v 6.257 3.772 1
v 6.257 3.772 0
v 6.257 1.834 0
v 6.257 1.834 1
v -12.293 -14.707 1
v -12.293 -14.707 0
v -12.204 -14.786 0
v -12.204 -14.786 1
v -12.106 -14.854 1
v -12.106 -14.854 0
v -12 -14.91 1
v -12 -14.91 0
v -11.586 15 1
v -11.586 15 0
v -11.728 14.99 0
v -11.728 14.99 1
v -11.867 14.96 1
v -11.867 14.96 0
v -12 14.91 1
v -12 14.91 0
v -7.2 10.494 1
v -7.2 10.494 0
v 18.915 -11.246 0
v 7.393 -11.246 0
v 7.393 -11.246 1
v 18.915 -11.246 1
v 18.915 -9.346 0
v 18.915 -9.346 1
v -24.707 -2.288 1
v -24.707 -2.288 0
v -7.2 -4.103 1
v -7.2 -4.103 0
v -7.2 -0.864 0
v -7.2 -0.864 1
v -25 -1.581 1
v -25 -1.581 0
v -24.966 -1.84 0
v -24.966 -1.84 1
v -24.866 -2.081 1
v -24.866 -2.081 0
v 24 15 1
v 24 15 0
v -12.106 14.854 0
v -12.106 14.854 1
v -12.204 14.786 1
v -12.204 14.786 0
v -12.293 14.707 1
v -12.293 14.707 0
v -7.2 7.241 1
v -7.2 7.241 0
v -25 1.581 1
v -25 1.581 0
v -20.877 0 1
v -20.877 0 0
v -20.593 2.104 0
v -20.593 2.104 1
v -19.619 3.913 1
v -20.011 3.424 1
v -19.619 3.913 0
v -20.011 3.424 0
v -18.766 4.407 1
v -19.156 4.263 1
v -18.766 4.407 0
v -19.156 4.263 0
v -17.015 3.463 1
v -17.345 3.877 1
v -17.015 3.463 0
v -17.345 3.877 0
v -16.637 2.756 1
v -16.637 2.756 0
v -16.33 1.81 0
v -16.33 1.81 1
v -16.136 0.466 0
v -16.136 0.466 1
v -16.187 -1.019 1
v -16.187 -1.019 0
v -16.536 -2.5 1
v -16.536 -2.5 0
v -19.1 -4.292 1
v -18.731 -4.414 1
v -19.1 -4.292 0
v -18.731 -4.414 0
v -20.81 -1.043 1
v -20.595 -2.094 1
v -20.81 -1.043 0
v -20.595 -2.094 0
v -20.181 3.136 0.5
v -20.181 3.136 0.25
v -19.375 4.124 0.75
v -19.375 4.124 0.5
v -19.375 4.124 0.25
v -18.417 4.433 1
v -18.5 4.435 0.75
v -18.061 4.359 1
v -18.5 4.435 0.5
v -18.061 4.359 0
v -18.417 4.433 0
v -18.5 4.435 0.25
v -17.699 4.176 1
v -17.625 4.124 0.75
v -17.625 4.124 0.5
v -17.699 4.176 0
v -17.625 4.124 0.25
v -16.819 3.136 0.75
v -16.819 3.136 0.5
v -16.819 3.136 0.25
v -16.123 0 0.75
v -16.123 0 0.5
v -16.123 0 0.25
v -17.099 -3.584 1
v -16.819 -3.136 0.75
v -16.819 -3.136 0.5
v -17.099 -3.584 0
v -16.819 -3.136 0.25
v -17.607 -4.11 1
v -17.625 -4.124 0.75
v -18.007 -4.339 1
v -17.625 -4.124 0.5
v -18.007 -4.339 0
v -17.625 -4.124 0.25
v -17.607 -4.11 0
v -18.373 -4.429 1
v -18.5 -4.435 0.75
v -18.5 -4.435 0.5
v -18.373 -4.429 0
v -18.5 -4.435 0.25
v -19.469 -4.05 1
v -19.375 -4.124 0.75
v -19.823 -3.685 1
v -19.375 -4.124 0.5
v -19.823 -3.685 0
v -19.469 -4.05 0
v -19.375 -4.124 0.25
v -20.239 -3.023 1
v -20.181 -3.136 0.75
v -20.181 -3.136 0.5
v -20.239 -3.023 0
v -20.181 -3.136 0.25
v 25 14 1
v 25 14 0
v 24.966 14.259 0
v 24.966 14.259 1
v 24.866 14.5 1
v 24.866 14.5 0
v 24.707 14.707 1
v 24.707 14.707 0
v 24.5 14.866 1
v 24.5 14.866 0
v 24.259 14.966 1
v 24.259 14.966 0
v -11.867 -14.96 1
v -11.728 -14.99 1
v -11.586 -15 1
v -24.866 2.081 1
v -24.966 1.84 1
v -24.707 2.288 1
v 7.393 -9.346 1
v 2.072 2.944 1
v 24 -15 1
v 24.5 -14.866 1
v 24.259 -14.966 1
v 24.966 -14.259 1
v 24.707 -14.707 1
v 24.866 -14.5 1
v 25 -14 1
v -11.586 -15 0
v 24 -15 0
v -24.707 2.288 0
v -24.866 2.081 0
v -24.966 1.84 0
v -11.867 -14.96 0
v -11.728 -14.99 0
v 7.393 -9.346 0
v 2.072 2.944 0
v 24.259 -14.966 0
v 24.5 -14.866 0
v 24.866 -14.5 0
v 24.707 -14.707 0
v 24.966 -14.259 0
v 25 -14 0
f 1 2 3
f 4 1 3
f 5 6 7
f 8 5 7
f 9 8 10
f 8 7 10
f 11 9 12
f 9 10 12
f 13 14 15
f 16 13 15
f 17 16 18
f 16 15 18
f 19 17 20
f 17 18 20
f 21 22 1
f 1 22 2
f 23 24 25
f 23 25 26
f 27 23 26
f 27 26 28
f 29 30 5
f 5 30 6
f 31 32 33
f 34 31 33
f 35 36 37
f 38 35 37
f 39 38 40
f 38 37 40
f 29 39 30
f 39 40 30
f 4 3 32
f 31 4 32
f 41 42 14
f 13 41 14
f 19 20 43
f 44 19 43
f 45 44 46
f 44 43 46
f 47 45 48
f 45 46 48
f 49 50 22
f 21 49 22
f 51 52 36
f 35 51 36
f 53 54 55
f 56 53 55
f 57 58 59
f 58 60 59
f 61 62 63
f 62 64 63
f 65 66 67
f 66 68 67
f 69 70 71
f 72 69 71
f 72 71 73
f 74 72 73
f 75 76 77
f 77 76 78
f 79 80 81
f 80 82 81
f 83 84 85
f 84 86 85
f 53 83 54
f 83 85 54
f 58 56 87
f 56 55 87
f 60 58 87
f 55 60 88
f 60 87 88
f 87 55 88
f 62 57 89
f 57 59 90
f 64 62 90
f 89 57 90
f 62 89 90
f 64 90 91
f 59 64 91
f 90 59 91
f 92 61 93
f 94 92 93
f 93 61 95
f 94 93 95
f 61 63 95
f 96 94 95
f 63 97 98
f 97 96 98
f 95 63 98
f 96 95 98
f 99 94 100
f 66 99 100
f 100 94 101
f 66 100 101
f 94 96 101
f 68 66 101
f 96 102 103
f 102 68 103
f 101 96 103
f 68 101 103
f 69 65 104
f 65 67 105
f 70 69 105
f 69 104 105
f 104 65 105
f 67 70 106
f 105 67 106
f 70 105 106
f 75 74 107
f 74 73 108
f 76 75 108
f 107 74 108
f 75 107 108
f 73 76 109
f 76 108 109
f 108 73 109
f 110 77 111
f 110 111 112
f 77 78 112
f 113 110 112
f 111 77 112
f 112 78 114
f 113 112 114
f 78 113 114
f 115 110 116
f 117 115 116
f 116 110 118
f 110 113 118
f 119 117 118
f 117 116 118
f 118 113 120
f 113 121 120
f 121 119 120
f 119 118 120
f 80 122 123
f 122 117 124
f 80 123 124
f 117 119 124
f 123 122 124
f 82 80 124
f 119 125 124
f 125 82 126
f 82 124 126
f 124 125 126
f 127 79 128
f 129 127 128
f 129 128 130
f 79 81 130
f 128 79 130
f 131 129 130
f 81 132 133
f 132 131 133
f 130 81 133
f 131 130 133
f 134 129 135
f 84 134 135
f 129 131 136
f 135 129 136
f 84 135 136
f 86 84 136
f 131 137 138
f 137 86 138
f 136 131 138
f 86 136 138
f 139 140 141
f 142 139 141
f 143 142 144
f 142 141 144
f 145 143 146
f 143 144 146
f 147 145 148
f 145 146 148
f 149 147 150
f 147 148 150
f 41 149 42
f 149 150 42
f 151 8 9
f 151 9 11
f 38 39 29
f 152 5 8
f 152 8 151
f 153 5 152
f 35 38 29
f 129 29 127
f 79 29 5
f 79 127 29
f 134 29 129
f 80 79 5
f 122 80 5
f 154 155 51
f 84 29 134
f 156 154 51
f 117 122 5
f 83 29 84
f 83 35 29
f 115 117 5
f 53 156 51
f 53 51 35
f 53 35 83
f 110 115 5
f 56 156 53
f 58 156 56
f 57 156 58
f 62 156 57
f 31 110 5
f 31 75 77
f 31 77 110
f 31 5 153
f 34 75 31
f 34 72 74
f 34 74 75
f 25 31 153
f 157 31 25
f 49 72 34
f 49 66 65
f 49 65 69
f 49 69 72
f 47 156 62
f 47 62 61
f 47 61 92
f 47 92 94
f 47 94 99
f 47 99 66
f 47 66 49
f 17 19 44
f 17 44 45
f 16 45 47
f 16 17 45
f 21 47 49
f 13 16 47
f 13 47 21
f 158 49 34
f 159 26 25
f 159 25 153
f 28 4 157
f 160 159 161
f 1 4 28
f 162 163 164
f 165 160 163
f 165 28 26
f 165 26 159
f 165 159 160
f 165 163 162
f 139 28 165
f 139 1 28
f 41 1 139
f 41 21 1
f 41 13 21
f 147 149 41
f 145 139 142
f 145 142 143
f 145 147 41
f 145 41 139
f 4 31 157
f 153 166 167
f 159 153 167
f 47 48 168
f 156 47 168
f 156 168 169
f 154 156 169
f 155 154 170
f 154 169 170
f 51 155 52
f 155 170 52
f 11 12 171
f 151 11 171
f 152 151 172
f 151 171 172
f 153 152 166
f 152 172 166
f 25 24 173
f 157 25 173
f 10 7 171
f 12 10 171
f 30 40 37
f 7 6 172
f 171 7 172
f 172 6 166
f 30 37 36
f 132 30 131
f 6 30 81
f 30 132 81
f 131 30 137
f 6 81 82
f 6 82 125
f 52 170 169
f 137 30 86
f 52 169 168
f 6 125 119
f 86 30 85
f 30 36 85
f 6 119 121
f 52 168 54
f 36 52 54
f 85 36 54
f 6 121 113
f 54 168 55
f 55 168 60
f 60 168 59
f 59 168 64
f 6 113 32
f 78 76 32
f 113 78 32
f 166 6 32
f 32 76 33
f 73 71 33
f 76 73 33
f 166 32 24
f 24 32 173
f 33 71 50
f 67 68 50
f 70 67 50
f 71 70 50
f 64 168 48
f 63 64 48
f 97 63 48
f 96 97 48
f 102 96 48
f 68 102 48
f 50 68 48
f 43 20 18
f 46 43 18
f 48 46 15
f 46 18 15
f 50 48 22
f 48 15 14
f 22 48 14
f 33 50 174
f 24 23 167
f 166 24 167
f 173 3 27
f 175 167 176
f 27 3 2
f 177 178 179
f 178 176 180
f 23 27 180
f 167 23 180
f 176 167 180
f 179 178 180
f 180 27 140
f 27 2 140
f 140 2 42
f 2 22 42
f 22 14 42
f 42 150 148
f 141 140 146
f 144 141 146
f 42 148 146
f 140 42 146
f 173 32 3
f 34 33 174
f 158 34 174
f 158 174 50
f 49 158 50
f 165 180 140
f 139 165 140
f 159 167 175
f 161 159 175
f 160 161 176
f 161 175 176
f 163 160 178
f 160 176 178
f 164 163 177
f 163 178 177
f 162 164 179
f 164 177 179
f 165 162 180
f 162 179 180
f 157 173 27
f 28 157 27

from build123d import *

# Parameters (mm, degrees)
F0_W     = 11.5222578289
F0_H     = 1.8994162322
F1_DEPTH = 1


with BuildPart() as f1:
    # F0 (on Top) → F1 (new body)
    with BuildSketch(Plane.XY):
        with BuildLine():
            ThreePointArc((24, -15), (24.7071067812, -14.7071067812), (25, -14))
            Line((25, -14), (25, 14))
            ThreePointArc((25, 14), (24.7071067812, 14.7071067812), (24, 15))
            Line((24, 15), (-11.5856783083, 15))
            ThreePointArc((-11.5856783083, 15), (-11.7976564855, 14.9772743997), (-12, 14.9101305048))
            Line((-12, 14.9101305048), (-12, 0))
            Line((-12, 0), (-12, -14.9101305048))
            ThreePointArc((-12, -14.9101305048), (-11.7976564855, -14.9772743997), (-11.5856783083, -15))
            Line((-11.5856783083, -15), (24, -15))
        make_face()
        with Locations((13.1538834292, -10.2958114322)):
            Rectangle(F0_W, F0_H, mode=Mode.SUBTRACT)
        Polygon((-7.1997925663, -4.1031941271), (-7.1997925663, -0.8637787721), (2.0717871244, 2.9437268258), (-7.1997925663, 7.2412644654), (-7.1997925663, 10.4936895206), (6.2565740288, 3.7720110732), (6.2565740288, 1.8335657403), align=None, mode=Mode.SUBTRACT)
        with BuildLine():
            ThreePointArc((-12.2929155961, -14.7069762504), (-12.1555831678, -14.8217106857), (-12, -14.9101305048))
            Line((-12, -14.9101305048), (-12, 0))
            Line((-12, 0), (-16.1229410425, 0))
            add(Edge.make_bspline(
                [(-20.8770589575, 0), (-20.8770589575, -4.4353879057), (-18.5, -4.4353879057), (-16.1229410425, -4.4353879057), (-16.1229410425, 0)],
                knots=[1.5707963268, 1.5707963268, 1.5707963268, 3.1415926536, 3.1415926536, 4.7123889804, 4.7123889804, 4.7123889804], degree=2, weights=[1, 0.7071067812, 1, 0.7071067812, 1]))
            Line((-20.8770589575, 0), (-25, 0))
            Line((-25, 0), (-25, -1.5810945587))
            ThreePointArc((-25, -1.5810945587), (-24.9239148467, -1.963692724), (-24.7072372878, -2.2880708092))
            Line((-24.7072372878, -2.2880708092), (-12.2929155961, -14.7069762504))
        make_face()
        with BuildLine():
            Line((-12, 0), (-12, 14.9101305048))
            ThreePointArc((-12, 14.9101305048), (-12.1555831678, 14.8217106857), (-12.2929155961, 14.7069762504))
            Line((-12.2929155961, 14.7069762504), (-24.7072372878, 2.2880708092))
            ThreePointArc((-24.7072372878, 2.2880708092), (-24.9239148467, 1.963692724), (-25, 1.5810945587))
            Line((-25, 1.5810945587), (-25, 0))
            Line((-25, 0), (-20.8770589575, 0))
            add(Edge.make_bspline(
                [(-18.5, 4.4353879057), (-20.8770589575, 4.4353879057), (-20.8770589575, 0)],
                knots=[0, 0, 0, 1.5707963268, 1.5707963268, 1.5707963268], degree=2, weights=[1, 0.7071067812, 1]))
            add(Edge.make_bspline(
                [(-16.1229410425, 0), (-16.1229410425, 4.4353879057), (-18.5, 4.4353879057)],
                knots=[4.7123889804, 4.7123889804, 4.7123889804, 6.2831853072, 6.2831853072, 6.2831853072], degree=2, weights=[1, 0.7071067812, 1]))
            Line((-16.1229410425, 0), (-12, 0))
        make_face()
    extrude(amount=F1_DEPTH)


solid = f1.part
